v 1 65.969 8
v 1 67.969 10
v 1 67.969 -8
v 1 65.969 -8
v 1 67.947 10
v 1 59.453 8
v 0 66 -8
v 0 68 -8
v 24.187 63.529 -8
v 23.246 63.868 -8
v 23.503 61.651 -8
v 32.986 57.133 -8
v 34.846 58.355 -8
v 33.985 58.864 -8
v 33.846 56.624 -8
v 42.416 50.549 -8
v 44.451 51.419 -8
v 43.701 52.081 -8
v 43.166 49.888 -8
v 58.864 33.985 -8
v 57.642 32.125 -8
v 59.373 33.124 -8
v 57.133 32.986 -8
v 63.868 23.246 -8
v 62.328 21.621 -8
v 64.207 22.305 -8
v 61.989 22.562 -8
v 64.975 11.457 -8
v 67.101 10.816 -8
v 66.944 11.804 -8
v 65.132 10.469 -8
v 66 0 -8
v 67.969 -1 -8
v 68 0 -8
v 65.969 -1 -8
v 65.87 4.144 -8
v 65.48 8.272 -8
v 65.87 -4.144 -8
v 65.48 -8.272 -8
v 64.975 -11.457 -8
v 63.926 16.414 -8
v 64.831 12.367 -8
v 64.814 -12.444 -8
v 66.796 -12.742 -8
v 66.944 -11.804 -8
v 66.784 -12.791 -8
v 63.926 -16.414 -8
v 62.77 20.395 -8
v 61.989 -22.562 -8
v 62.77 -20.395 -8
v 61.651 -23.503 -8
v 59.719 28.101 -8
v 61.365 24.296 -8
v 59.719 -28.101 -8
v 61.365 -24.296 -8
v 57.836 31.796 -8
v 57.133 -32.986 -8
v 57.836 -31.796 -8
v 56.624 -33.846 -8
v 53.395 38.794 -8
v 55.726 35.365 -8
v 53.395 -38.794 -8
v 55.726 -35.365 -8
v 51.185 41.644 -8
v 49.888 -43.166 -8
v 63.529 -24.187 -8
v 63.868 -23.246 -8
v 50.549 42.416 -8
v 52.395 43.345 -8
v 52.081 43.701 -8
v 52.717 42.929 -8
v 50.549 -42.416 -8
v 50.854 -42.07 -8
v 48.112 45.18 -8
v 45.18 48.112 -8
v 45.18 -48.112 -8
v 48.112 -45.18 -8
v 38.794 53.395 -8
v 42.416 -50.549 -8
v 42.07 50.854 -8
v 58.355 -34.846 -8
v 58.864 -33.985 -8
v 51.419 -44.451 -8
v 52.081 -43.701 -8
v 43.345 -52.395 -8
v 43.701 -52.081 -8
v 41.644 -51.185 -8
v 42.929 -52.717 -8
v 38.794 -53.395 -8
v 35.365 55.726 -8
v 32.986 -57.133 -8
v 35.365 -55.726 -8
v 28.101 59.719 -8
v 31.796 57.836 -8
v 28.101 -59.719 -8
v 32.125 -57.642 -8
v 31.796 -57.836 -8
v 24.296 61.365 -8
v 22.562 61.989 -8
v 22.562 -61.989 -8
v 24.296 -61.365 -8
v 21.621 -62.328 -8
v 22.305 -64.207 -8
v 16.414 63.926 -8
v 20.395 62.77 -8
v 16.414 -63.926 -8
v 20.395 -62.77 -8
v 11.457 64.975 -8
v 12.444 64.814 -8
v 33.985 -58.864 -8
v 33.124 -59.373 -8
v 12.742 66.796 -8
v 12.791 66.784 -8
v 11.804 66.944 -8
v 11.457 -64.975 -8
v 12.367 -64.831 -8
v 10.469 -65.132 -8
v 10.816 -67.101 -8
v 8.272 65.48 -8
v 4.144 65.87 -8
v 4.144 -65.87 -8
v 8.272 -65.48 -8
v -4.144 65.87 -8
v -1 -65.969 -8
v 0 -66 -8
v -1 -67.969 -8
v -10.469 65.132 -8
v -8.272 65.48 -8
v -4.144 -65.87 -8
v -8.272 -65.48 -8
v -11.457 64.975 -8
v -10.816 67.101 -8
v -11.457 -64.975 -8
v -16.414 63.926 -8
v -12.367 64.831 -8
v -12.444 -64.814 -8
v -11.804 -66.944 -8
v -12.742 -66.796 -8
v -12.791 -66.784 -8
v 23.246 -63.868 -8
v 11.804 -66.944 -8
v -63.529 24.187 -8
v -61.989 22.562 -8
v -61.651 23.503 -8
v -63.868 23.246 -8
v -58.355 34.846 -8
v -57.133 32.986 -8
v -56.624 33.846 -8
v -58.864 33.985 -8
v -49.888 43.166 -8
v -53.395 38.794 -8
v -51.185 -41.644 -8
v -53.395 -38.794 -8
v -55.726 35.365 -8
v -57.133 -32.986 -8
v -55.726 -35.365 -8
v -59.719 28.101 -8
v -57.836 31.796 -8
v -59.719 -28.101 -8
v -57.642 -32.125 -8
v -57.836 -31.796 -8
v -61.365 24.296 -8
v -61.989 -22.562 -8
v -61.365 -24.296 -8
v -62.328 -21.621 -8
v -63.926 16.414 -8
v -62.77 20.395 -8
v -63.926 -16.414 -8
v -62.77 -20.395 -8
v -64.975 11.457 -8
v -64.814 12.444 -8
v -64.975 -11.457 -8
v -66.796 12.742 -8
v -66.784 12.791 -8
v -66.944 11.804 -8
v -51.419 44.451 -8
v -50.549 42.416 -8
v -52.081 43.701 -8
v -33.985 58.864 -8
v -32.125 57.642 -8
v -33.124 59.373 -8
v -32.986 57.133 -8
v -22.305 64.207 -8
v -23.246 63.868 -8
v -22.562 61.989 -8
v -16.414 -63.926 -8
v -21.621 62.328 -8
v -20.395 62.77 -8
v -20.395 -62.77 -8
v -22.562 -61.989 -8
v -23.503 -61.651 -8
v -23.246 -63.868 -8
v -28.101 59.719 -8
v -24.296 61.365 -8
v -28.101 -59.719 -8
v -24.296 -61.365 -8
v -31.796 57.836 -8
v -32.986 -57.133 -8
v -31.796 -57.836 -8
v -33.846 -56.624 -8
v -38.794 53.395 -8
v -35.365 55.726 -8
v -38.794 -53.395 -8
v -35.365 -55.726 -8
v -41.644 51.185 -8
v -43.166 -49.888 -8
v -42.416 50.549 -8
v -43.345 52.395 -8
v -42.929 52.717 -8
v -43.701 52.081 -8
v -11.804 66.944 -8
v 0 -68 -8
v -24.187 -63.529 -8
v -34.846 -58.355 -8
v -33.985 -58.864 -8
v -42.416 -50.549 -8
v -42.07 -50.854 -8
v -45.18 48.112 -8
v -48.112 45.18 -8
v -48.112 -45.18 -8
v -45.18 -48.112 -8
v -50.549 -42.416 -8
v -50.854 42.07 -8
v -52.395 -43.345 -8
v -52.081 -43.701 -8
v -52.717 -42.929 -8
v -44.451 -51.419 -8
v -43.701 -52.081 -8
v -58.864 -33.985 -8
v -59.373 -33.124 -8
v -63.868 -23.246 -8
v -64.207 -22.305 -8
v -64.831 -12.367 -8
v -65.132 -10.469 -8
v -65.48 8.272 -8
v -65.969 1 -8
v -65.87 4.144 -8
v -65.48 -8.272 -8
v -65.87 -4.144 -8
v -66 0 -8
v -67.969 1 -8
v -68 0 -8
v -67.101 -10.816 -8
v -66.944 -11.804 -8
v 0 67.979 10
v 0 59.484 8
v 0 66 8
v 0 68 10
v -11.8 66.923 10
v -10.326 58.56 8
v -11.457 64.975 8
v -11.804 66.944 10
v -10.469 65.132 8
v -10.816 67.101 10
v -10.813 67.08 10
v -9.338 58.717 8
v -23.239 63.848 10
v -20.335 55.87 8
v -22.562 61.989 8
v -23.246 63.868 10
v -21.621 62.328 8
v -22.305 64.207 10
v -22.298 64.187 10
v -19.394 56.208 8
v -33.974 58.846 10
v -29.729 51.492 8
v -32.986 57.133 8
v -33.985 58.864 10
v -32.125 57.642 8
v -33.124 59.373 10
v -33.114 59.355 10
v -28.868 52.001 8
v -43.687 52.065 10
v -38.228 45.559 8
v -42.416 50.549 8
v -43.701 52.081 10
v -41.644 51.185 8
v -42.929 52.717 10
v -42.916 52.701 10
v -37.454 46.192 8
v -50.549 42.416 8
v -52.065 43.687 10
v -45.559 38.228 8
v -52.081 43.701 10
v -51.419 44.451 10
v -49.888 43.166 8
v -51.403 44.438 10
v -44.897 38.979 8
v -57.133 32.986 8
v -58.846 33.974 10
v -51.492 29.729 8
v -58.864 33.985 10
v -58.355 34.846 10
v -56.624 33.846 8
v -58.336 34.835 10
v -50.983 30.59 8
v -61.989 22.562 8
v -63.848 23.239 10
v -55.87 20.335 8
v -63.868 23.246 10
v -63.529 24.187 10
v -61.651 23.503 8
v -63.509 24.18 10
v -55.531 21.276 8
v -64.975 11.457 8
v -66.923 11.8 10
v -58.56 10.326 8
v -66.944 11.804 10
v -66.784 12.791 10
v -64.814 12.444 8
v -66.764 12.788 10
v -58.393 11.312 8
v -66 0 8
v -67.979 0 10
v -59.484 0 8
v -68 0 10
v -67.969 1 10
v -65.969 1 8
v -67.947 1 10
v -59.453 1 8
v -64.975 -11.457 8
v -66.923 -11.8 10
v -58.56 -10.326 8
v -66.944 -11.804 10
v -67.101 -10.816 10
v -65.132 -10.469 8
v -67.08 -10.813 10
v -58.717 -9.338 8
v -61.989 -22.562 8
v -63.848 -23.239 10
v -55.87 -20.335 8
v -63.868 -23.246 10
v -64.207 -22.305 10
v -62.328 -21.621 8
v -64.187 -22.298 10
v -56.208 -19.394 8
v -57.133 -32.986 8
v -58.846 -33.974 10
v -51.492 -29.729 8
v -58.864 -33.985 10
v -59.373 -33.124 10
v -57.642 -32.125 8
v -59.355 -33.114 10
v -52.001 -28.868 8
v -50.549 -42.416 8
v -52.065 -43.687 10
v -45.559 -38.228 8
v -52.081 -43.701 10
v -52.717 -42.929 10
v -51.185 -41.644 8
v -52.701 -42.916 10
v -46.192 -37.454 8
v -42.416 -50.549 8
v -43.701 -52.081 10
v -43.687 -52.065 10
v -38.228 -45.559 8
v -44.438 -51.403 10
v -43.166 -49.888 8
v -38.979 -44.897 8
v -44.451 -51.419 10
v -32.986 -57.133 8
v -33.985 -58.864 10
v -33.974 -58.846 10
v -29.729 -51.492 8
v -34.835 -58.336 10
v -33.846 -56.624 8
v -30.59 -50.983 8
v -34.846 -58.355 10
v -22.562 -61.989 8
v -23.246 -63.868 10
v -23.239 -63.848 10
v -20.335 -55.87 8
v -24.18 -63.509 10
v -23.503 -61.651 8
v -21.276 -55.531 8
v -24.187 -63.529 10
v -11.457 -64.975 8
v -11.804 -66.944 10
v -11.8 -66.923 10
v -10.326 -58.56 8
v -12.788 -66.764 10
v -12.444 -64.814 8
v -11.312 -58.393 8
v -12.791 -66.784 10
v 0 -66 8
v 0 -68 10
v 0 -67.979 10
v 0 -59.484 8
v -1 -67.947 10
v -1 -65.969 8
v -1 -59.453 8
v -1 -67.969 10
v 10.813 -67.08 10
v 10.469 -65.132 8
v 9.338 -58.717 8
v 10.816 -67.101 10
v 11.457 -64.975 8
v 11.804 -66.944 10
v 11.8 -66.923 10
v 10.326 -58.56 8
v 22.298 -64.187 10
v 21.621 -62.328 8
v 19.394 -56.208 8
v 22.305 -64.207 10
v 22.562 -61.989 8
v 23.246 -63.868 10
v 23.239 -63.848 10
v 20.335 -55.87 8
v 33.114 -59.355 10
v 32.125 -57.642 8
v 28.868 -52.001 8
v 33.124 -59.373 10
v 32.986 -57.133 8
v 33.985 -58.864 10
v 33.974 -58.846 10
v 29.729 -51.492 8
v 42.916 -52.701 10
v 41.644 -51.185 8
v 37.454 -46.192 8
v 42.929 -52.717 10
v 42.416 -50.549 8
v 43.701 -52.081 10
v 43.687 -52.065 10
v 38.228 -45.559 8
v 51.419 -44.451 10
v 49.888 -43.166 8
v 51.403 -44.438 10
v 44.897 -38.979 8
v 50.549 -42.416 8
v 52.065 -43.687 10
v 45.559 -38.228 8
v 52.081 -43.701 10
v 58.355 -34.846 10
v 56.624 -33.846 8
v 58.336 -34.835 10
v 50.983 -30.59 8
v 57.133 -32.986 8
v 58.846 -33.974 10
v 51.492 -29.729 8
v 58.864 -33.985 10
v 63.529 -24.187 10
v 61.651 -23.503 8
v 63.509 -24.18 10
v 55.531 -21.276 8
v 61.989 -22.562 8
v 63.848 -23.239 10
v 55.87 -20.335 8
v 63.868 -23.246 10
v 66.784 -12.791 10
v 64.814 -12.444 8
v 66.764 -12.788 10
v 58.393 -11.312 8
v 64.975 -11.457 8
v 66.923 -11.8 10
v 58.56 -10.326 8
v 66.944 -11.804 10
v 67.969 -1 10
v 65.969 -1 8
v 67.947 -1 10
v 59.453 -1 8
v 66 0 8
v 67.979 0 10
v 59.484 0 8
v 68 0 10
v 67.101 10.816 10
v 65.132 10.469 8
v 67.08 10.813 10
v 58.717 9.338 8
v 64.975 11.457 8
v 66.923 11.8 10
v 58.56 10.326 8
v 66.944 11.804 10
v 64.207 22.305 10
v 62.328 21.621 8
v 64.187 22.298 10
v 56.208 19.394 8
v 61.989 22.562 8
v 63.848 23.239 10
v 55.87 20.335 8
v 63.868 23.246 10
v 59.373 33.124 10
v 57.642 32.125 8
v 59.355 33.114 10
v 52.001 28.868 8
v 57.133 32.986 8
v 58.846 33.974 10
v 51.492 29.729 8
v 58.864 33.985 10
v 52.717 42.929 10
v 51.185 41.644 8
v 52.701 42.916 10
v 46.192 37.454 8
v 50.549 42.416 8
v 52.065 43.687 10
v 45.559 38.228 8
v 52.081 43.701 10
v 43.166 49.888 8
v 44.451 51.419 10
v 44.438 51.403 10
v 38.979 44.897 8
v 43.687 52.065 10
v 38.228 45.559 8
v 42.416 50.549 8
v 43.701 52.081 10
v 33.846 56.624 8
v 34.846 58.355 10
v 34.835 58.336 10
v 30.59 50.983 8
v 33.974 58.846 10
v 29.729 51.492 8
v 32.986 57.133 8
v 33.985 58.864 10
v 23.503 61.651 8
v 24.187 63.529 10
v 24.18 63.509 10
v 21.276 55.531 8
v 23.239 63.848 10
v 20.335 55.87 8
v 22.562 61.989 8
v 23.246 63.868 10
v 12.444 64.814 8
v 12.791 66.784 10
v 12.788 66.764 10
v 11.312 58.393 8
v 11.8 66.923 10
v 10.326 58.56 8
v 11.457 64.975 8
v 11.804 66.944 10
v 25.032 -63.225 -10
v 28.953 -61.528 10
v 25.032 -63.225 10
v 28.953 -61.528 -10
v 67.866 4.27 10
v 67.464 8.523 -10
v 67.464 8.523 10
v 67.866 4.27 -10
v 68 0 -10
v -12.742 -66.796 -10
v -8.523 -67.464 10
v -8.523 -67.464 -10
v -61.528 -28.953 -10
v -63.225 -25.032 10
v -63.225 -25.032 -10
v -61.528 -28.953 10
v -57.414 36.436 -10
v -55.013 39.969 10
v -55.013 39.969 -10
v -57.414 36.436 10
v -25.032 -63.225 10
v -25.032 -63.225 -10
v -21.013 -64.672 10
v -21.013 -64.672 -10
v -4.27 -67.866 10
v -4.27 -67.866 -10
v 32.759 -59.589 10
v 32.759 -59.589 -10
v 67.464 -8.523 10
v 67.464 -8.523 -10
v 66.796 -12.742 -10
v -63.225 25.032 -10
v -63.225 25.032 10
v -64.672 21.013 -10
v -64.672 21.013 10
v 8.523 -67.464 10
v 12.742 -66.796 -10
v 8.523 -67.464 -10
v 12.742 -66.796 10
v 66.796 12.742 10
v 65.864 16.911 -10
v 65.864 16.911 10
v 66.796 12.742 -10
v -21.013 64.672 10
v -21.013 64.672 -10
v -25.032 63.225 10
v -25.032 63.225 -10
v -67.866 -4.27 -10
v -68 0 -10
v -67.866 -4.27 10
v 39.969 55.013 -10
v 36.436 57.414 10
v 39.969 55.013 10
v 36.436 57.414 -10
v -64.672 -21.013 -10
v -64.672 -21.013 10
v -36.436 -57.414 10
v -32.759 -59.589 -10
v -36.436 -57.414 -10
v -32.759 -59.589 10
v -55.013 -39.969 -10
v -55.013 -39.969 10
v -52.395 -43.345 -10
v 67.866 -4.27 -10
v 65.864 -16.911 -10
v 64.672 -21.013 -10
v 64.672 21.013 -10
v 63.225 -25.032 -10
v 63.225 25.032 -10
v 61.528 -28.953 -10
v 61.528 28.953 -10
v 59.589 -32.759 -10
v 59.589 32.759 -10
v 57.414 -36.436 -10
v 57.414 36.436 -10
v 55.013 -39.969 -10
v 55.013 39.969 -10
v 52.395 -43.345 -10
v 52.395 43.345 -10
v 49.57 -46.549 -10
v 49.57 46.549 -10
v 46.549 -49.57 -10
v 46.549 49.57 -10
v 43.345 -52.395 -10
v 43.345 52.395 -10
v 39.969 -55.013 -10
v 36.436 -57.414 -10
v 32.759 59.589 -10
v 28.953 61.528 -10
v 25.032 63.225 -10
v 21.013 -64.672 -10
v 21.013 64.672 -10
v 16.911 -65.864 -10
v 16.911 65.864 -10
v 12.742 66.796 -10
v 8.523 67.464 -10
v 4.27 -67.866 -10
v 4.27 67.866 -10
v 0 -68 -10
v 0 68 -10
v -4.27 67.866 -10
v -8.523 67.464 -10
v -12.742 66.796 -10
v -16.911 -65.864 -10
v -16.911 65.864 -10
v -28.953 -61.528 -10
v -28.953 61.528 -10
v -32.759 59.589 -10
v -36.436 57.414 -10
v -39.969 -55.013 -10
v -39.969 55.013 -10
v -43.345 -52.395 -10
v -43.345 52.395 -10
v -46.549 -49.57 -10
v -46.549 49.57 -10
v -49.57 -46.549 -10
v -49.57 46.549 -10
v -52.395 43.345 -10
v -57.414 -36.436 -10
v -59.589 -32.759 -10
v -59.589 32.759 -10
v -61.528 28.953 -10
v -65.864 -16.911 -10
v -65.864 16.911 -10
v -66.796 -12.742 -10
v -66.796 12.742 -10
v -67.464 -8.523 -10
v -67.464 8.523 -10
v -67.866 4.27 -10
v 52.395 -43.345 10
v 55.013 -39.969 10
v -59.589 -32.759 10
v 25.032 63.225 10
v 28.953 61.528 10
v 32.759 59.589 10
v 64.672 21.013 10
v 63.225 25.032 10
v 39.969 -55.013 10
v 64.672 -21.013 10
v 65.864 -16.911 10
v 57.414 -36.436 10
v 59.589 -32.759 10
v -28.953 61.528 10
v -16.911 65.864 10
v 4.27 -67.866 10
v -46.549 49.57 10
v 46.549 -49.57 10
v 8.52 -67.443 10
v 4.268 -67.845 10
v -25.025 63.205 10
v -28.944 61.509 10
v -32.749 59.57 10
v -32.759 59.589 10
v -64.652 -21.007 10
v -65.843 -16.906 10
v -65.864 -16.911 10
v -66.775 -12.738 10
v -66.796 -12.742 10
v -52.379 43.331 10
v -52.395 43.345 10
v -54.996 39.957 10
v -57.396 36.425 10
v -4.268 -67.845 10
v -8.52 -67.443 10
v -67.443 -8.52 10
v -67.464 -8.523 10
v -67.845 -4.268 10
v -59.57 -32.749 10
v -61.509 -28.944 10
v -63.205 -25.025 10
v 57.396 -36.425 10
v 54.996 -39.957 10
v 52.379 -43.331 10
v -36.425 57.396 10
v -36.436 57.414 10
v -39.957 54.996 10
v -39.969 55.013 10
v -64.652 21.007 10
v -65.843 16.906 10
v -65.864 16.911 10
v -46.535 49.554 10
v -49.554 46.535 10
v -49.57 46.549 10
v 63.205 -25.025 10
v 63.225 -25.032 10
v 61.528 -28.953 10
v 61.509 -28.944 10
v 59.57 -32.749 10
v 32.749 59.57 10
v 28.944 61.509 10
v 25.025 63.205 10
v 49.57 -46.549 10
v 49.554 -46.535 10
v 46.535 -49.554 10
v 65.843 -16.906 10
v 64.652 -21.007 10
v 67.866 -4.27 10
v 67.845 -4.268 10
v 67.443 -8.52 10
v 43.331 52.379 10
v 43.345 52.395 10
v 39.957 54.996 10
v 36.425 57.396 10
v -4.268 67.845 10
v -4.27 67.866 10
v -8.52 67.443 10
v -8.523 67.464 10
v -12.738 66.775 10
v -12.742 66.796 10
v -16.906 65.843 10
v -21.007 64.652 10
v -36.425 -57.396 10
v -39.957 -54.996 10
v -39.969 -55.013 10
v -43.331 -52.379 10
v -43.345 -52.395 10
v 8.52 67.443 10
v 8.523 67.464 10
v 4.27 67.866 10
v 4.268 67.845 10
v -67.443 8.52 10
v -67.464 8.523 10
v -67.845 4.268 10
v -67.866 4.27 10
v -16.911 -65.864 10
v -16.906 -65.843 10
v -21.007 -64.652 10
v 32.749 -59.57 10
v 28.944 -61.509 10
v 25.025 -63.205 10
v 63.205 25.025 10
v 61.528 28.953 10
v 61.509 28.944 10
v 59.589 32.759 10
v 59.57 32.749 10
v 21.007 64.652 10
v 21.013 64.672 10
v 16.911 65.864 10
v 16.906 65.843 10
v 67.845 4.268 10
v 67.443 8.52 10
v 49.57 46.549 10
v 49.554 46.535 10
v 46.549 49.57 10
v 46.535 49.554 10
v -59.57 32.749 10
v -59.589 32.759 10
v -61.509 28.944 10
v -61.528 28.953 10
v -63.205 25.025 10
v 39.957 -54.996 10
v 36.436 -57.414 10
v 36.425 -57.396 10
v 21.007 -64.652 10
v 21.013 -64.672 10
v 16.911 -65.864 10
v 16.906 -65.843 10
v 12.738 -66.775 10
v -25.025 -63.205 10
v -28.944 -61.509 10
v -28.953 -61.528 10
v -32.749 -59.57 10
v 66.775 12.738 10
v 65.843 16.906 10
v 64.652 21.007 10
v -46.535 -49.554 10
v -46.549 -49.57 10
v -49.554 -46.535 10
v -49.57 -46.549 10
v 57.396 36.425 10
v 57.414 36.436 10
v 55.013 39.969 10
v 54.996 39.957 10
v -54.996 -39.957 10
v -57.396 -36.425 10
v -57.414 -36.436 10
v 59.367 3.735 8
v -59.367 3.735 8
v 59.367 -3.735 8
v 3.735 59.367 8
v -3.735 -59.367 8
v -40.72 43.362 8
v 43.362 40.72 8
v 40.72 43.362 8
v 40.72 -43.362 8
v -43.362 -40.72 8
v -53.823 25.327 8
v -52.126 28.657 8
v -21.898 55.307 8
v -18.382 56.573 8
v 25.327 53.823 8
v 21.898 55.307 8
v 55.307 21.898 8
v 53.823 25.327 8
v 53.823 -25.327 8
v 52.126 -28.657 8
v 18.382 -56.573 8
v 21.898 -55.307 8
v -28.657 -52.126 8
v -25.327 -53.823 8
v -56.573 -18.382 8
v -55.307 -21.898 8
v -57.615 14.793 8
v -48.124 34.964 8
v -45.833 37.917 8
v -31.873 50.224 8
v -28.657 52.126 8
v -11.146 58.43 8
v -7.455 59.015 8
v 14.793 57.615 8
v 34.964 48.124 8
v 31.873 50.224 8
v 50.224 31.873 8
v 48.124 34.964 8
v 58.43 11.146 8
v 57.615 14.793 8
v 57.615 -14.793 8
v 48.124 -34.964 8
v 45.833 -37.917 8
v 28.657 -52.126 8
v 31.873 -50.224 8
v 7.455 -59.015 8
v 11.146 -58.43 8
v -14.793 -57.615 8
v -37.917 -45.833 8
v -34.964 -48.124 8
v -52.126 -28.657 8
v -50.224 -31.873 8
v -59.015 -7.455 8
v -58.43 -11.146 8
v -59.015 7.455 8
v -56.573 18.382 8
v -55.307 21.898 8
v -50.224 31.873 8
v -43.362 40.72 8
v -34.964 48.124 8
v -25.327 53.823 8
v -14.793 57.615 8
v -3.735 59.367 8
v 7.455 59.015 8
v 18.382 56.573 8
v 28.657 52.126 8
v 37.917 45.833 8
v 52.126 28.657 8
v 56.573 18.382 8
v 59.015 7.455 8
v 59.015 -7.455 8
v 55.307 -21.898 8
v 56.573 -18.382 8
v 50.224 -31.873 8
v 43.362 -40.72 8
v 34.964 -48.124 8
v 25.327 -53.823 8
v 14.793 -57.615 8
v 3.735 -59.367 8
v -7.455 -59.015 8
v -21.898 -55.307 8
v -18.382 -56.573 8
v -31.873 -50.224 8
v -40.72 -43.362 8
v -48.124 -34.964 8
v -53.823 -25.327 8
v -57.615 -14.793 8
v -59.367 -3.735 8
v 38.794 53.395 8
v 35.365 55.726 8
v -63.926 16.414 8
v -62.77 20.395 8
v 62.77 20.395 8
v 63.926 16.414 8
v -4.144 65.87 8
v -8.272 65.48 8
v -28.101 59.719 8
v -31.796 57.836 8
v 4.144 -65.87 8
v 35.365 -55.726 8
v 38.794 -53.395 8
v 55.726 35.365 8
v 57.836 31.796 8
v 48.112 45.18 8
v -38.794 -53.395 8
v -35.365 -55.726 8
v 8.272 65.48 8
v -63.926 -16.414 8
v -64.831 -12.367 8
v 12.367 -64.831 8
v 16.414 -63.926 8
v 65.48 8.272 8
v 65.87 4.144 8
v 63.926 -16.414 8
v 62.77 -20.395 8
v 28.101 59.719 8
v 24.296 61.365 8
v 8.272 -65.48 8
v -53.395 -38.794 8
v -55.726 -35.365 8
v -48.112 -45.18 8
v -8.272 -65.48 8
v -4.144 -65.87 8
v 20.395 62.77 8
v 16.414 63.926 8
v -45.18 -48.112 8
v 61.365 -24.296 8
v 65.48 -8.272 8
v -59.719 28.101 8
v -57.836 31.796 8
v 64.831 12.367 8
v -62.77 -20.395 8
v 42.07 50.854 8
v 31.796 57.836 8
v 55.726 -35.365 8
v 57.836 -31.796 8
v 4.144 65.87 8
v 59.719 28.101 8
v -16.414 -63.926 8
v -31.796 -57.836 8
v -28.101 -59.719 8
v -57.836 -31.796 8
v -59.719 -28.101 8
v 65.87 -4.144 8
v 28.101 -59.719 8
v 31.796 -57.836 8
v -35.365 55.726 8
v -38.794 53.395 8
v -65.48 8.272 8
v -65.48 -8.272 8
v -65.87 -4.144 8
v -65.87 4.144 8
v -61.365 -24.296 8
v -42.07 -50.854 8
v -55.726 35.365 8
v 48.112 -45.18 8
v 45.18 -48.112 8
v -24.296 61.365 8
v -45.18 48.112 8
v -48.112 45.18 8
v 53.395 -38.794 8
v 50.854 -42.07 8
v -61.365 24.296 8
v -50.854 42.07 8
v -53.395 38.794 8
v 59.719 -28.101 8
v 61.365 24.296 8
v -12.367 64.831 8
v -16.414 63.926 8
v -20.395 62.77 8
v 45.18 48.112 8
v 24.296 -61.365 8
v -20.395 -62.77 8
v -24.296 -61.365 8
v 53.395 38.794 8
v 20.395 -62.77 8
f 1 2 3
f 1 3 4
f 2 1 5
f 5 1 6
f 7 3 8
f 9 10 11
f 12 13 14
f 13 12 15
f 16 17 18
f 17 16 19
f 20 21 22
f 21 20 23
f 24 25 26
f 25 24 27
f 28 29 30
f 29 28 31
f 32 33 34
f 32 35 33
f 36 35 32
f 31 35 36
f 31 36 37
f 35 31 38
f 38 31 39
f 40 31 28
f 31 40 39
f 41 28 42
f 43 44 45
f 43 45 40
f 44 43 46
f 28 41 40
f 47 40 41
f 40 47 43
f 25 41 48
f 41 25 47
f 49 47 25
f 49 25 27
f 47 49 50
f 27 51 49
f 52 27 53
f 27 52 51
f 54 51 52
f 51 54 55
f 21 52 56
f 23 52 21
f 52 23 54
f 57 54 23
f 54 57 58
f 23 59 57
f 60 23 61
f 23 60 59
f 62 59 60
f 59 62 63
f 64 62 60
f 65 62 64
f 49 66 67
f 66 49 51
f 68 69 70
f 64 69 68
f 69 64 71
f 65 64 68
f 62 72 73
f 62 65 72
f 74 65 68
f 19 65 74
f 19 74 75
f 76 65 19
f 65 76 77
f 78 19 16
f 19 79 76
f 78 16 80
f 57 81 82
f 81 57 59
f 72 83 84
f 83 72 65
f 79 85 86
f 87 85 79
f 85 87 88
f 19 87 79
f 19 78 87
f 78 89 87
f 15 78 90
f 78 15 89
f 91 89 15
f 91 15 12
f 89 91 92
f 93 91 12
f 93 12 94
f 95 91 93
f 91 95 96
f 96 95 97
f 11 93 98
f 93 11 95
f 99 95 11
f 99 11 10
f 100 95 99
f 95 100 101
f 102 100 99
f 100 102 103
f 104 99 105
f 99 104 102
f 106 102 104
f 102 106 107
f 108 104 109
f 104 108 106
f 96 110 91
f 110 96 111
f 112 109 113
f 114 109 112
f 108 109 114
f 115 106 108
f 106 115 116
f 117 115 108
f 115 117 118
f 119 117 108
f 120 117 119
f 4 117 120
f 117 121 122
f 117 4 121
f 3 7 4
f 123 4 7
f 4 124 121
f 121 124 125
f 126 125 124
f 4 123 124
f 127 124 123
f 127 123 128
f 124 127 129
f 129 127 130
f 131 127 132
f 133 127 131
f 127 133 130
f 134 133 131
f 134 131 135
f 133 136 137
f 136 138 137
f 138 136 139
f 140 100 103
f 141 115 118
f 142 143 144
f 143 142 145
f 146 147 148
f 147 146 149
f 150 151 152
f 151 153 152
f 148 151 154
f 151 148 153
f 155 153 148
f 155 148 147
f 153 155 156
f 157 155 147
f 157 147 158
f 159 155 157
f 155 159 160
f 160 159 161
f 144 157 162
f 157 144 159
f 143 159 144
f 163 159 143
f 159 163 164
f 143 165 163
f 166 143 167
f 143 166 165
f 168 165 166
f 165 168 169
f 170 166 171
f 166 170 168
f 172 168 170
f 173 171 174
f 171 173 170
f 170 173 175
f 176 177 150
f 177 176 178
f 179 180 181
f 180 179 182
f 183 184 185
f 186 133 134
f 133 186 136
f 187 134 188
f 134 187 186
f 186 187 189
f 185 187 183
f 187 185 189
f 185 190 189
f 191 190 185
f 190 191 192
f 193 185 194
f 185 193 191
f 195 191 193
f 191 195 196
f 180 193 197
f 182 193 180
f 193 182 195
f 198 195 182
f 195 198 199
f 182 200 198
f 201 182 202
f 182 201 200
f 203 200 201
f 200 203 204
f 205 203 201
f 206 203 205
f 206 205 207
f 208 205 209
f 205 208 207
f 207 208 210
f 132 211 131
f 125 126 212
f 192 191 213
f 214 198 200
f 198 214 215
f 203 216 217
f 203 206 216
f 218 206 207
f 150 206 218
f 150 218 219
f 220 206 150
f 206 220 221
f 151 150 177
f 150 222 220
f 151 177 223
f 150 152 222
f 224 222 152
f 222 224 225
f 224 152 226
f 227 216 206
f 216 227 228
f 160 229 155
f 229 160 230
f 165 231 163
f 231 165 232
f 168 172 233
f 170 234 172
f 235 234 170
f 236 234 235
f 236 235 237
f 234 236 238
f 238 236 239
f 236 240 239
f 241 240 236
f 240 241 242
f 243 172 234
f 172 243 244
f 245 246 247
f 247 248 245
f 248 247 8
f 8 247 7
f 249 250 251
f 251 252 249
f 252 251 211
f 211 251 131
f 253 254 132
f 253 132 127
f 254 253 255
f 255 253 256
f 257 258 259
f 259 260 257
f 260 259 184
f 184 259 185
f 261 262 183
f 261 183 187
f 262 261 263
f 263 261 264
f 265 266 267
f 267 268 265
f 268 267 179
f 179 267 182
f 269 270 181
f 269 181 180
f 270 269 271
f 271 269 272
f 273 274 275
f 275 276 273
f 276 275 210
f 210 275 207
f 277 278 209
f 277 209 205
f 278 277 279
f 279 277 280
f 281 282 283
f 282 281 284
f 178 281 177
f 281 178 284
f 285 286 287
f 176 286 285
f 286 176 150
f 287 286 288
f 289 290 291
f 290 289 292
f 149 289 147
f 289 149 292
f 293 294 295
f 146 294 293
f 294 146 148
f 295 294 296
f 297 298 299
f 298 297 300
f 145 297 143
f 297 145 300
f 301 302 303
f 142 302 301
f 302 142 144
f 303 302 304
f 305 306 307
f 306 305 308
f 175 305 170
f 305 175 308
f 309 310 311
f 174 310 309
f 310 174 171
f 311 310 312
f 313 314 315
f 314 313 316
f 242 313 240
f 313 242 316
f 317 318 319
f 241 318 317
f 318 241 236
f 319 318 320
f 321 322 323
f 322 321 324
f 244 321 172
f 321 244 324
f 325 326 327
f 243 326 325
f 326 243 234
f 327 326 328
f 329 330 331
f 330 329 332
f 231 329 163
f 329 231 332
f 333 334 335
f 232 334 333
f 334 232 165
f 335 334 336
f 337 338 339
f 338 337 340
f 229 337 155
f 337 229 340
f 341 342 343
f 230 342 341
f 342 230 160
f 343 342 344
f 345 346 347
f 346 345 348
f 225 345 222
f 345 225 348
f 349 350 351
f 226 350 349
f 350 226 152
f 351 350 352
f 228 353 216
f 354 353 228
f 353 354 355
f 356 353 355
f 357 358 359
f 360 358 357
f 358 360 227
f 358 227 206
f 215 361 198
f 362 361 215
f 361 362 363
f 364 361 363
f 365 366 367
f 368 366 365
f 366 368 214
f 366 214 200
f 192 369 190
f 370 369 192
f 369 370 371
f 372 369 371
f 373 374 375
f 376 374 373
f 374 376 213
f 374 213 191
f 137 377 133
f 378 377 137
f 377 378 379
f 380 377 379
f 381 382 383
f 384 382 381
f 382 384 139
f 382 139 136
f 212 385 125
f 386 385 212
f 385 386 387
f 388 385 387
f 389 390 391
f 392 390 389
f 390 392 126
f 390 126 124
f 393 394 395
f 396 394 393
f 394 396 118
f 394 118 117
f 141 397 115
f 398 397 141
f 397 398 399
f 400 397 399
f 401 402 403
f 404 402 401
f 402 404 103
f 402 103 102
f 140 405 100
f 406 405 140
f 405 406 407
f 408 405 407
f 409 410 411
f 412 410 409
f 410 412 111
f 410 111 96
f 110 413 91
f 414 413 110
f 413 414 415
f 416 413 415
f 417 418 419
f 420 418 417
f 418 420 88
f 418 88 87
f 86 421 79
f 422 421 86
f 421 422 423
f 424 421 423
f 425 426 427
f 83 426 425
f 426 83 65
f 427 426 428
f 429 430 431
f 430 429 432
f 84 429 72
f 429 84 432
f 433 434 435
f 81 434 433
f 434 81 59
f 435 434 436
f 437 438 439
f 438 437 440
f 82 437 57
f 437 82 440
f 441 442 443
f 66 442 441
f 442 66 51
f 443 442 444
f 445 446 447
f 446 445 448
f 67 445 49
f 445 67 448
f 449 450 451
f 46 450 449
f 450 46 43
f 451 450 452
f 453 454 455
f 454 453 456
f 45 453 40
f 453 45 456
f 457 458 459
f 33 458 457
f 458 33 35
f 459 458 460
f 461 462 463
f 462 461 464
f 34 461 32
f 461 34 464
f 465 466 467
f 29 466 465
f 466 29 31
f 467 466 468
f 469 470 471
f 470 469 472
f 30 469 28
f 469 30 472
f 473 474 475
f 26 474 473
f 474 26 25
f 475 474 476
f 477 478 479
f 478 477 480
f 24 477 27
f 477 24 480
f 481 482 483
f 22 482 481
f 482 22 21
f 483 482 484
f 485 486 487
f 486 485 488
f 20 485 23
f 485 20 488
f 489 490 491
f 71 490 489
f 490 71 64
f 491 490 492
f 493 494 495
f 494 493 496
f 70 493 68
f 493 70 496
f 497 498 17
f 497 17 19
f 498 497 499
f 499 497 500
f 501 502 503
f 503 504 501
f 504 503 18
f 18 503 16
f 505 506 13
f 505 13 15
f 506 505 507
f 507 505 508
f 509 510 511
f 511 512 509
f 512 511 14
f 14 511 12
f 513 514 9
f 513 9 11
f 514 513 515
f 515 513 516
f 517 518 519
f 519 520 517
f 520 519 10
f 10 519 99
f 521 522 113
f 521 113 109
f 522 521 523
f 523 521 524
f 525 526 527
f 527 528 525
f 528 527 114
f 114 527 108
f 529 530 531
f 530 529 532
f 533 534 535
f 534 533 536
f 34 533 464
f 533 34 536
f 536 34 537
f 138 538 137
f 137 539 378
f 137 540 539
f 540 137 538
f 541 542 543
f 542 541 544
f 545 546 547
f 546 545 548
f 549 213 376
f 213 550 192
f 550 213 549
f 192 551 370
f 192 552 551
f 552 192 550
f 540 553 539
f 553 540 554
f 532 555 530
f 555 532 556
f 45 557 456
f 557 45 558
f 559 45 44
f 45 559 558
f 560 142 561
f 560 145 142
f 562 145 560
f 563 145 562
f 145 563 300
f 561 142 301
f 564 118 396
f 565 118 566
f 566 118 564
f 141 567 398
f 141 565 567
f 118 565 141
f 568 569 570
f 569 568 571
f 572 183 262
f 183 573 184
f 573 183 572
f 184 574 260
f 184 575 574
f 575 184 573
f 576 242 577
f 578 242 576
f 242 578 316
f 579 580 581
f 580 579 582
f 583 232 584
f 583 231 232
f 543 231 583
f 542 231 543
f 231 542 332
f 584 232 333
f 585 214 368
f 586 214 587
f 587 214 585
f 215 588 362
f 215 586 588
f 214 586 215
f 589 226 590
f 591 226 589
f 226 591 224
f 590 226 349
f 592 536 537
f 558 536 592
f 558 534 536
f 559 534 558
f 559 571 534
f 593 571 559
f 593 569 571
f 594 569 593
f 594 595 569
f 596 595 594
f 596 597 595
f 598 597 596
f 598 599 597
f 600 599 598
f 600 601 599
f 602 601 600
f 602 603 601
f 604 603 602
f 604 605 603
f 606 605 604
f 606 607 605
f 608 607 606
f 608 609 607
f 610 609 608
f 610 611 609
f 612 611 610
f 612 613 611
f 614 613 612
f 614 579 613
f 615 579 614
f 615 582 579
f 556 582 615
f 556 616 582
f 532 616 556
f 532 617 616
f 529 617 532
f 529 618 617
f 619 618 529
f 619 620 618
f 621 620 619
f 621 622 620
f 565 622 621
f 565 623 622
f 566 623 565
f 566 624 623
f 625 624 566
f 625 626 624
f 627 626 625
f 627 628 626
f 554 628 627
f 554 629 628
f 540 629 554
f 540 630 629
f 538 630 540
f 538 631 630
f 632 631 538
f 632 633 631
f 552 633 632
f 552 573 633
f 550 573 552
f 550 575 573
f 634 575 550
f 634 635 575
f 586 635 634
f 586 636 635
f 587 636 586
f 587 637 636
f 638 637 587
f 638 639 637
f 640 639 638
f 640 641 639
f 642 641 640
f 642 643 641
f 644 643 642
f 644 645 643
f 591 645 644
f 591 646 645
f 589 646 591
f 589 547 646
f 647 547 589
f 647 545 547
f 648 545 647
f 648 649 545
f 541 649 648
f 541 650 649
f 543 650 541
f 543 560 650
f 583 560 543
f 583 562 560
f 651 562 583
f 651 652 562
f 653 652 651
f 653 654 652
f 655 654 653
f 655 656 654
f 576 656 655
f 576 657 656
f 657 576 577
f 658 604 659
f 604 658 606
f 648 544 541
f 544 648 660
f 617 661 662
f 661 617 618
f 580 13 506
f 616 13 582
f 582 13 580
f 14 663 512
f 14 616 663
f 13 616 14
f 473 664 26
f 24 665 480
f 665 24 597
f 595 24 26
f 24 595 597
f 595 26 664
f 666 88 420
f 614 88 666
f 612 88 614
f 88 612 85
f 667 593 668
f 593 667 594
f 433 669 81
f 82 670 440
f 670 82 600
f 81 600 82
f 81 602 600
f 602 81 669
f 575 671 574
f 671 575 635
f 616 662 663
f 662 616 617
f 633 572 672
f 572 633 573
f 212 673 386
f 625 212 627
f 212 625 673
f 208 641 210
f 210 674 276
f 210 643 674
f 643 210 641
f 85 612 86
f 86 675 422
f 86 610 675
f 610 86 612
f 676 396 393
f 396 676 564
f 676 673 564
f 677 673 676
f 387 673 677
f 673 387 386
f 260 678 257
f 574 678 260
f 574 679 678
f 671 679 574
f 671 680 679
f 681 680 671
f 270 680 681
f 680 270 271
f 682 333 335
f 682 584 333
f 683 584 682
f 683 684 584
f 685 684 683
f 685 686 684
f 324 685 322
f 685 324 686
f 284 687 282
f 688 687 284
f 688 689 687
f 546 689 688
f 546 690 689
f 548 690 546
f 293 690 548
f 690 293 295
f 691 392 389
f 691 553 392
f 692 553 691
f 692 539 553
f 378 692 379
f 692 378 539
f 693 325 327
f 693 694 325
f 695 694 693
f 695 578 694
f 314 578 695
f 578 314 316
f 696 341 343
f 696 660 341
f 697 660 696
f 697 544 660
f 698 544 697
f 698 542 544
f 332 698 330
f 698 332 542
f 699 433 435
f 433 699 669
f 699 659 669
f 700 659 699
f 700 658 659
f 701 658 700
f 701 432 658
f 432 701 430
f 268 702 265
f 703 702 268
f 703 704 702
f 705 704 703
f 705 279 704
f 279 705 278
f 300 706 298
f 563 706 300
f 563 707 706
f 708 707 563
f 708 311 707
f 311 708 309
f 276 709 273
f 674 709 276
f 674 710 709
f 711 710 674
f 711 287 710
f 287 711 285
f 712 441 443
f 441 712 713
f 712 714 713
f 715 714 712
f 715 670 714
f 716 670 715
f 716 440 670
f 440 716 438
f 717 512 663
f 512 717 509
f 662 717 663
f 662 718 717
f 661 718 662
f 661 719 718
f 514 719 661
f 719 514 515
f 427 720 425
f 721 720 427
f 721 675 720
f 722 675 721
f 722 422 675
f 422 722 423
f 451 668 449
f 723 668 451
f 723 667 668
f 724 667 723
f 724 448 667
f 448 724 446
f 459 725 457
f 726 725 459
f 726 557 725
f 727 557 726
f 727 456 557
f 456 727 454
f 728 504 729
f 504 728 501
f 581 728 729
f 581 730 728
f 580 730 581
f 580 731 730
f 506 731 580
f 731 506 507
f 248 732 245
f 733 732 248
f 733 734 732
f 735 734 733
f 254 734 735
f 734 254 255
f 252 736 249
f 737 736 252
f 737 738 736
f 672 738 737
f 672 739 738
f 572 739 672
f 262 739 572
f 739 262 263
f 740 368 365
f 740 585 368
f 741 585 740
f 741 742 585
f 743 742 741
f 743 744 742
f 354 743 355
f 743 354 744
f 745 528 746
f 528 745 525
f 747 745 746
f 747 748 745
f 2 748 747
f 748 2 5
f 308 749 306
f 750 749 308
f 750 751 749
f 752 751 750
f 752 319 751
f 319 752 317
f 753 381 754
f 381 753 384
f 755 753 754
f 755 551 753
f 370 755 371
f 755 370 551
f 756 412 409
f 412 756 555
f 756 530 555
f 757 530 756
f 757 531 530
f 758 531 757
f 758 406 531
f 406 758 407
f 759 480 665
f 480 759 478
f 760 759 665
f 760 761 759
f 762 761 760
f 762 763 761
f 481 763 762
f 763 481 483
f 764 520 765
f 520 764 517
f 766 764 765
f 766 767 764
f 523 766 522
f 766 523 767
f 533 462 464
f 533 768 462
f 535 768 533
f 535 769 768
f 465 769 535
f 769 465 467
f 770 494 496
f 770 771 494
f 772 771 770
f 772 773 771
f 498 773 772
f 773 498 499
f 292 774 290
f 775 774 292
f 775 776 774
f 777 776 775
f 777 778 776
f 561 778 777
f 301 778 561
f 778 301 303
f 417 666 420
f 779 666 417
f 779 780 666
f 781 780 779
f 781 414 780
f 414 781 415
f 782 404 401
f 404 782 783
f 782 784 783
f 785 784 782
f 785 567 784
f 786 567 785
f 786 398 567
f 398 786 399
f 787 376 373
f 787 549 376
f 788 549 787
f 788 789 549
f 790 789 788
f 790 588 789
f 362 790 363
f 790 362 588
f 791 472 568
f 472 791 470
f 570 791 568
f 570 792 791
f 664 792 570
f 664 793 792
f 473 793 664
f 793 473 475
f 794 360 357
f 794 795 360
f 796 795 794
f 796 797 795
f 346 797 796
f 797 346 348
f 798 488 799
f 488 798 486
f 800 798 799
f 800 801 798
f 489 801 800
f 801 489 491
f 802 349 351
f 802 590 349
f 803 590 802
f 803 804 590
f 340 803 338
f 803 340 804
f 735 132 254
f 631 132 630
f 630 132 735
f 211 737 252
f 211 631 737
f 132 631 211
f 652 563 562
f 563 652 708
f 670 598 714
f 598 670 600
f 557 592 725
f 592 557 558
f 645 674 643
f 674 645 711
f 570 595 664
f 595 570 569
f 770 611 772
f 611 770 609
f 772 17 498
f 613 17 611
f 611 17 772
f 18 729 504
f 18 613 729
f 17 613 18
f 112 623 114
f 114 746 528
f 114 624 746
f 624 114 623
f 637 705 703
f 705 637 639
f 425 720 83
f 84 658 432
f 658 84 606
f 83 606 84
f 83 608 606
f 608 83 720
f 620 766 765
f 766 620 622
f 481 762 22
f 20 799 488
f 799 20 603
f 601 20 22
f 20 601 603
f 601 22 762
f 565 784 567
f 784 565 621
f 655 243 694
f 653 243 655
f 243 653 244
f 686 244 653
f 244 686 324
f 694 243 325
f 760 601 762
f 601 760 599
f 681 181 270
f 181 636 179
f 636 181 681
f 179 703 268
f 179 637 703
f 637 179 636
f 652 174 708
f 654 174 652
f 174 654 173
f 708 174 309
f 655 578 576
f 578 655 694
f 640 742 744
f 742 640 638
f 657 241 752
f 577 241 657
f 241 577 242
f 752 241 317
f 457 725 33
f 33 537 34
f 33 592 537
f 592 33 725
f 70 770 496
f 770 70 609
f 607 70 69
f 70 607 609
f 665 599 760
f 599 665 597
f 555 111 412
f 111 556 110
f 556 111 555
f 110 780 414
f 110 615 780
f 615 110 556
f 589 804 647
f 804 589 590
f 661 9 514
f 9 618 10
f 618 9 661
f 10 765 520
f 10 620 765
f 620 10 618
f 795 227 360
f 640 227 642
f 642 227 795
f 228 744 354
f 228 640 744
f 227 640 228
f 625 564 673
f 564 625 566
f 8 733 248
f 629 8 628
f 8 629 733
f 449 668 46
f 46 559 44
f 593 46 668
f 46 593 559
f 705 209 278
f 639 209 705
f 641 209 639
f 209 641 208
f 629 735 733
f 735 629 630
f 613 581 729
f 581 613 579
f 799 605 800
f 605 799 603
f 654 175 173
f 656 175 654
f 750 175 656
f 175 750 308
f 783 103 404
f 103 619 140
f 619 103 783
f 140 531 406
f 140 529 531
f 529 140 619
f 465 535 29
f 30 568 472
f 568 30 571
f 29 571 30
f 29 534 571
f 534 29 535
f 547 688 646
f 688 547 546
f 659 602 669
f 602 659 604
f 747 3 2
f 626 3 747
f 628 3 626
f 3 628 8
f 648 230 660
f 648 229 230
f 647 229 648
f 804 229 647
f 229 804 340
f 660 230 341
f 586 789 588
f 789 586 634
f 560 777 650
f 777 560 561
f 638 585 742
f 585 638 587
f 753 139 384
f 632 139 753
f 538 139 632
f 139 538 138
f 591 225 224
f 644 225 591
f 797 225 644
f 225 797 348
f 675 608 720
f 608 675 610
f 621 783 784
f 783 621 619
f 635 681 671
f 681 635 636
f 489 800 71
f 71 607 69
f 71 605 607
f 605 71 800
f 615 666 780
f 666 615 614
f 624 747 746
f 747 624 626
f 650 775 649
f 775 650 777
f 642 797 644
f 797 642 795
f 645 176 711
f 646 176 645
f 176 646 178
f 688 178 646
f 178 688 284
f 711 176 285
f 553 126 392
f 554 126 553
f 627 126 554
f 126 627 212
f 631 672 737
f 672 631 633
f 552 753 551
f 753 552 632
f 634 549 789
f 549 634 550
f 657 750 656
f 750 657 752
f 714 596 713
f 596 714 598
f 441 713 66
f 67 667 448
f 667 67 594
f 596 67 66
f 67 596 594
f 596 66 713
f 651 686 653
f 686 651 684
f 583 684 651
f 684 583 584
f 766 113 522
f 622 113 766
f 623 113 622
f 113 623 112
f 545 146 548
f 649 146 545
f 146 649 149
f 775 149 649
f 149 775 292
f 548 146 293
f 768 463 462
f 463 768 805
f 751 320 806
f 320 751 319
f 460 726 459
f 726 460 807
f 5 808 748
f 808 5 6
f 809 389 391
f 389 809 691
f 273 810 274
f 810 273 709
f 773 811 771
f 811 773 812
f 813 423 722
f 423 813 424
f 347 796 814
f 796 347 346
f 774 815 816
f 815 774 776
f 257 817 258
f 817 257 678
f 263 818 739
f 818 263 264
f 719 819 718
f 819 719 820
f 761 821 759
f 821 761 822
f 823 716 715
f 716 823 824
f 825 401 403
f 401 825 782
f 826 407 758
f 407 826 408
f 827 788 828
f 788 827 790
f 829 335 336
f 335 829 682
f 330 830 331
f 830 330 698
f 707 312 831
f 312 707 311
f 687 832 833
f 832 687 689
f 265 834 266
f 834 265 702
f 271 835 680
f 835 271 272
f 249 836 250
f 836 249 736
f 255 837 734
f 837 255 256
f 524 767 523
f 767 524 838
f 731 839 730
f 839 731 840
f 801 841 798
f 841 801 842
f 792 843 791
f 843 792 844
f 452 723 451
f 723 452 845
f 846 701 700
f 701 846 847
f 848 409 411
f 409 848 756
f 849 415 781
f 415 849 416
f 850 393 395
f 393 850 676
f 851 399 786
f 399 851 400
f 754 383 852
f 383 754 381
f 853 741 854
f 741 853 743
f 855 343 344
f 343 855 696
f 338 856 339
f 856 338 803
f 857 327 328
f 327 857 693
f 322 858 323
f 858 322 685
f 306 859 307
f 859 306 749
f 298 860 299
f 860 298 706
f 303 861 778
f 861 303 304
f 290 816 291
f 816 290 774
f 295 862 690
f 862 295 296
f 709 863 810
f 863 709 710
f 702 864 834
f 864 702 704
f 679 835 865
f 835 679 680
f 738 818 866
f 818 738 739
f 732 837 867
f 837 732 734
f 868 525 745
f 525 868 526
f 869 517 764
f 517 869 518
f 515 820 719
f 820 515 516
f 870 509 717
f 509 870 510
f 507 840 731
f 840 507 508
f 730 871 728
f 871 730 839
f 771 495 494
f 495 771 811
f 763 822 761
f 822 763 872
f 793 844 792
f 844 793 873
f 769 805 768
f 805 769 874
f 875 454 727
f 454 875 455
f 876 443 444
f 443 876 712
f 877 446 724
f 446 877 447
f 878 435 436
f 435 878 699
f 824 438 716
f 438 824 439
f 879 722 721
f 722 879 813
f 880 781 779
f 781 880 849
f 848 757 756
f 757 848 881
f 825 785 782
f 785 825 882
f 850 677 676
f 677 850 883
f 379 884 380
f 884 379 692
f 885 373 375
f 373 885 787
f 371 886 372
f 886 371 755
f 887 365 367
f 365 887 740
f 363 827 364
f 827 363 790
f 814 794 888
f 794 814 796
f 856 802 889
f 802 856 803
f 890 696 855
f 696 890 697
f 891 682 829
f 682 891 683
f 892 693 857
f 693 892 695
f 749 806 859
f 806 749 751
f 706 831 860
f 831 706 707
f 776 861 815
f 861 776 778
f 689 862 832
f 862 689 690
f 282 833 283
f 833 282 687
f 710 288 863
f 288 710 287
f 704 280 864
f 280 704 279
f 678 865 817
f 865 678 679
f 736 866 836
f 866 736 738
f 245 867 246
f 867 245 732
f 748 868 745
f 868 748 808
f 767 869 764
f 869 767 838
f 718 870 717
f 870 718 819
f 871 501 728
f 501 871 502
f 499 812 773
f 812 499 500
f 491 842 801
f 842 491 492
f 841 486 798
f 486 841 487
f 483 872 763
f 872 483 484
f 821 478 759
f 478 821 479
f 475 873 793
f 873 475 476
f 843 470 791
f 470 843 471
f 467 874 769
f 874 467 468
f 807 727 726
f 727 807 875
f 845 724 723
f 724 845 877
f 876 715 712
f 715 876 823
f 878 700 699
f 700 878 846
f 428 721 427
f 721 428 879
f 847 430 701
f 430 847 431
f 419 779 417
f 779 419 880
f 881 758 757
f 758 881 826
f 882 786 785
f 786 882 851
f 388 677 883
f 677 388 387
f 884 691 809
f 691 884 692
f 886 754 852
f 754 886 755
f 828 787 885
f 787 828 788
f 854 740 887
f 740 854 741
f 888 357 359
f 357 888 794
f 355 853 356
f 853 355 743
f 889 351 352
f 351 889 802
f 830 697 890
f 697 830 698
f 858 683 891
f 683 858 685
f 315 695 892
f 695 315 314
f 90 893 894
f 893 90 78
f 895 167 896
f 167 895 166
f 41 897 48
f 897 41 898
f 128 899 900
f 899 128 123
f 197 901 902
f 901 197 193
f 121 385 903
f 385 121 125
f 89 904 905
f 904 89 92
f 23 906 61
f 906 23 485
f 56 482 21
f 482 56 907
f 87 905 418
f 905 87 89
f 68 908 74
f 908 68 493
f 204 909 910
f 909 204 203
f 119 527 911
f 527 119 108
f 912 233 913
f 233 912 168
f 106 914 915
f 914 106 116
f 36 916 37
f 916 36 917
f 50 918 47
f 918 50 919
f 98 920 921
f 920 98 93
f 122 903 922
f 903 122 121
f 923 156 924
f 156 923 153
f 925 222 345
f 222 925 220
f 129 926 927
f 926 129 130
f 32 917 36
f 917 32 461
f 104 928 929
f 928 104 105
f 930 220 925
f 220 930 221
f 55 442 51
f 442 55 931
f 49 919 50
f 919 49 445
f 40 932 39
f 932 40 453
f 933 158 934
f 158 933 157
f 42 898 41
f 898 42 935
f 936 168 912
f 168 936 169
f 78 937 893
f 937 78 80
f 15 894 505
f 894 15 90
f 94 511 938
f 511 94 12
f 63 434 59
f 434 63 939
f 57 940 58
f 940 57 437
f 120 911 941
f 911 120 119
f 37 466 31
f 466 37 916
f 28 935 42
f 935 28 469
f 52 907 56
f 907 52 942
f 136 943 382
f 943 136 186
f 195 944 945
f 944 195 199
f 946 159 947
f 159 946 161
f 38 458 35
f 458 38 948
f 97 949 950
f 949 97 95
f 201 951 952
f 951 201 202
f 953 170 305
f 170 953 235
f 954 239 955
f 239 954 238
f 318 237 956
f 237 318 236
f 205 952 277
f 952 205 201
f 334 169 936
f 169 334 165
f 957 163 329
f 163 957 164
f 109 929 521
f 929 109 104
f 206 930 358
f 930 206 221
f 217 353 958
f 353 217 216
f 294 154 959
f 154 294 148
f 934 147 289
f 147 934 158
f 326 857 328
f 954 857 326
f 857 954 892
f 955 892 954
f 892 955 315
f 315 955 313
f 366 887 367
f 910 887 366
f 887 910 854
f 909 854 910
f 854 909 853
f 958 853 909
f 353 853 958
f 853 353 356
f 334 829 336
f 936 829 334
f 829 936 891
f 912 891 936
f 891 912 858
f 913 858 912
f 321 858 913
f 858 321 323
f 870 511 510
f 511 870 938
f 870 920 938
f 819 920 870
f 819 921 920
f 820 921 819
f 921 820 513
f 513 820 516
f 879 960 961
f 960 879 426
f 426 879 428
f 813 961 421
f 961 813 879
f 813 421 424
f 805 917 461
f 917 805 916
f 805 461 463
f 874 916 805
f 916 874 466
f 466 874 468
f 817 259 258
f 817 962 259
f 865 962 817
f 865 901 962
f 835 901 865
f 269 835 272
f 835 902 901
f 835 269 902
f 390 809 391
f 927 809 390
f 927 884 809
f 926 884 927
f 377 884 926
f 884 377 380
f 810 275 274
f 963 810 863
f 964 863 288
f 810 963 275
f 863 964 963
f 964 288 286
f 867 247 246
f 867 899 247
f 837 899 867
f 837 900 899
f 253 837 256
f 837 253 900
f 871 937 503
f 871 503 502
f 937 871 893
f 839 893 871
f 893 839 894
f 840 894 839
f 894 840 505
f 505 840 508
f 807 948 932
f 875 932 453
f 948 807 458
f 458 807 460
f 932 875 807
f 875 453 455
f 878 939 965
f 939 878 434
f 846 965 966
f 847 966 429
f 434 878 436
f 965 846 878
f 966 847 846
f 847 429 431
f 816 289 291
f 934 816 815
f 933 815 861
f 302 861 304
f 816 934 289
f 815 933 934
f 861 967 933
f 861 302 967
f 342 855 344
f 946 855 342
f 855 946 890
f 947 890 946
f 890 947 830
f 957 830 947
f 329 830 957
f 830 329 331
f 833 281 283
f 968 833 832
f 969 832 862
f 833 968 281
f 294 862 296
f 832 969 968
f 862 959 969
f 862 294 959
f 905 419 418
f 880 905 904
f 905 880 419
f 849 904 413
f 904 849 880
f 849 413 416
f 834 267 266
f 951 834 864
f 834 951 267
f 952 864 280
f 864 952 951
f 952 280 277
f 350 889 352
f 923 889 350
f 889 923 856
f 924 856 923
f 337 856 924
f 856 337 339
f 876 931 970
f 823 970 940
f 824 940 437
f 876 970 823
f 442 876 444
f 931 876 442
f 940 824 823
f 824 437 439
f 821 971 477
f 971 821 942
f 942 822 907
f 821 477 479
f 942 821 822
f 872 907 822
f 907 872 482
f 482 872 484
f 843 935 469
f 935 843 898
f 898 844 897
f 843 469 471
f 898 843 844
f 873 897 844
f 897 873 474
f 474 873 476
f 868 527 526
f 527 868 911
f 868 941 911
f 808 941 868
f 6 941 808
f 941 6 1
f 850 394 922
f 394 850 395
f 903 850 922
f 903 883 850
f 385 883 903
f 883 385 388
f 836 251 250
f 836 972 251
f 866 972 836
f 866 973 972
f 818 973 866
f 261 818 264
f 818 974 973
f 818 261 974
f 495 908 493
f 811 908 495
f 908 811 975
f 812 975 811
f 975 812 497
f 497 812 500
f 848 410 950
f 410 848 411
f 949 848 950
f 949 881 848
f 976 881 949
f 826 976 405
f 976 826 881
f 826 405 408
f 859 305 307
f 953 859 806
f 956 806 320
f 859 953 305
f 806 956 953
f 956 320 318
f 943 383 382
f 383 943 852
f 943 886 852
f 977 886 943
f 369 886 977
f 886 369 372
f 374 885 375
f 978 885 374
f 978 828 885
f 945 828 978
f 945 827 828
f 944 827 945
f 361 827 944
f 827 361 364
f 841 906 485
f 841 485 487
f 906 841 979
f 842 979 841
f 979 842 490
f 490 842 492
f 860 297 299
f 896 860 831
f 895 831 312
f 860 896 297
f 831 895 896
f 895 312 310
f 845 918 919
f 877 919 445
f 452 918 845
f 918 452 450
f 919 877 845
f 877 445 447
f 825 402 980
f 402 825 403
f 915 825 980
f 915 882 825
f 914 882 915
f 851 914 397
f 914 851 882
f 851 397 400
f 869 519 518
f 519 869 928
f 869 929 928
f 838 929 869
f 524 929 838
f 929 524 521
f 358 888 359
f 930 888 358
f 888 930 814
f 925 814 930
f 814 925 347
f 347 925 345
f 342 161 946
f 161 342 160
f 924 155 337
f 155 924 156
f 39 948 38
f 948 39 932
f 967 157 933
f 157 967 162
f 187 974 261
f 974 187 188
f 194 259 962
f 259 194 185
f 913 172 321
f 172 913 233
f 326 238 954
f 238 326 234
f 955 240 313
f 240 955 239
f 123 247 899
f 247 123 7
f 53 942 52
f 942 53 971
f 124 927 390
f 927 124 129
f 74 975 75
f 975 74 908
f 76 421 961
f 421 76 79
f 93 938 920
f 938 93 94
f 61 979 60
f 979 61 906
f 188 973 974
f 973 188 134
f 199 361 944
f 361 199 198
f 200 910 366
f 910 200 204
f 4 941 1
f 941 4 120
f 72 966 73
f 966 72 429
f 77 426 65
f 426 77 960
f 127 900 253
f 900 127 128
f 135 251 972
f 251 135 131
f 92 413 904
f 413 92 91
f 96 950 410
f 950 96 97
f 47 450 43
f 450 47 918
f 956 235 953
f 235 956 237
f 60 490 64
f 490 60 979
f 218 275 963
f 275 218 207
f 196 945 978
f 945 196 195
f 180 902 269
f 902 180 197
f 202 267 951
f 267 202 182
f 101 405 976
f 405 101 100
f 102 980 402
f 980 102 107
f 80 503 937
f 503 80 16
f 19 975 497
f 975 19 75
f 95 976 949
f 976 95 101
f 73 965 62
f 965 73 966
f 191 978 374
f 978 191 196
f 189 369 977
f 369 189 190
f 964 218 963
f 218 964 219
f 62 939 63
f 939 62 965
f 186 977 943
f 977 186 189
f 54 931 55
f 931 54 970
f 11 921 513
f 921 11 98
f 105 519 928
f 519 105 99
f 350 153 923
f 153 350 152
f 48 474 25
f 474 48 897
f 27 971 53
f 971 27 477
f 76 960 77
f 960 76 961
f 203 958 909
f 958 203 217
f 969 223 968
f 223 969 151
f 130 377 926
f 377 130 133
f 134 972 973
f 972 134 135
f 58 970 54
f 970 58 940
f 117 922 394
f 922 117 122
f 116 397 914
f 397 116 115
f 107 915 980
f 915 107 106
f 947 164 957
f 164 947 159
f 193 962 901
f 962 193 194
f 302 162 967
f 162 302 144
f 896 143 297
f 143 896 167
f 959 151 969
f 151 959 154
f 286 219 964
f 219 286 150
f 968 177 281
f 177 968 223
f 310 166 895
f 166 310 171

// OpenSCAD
// Internal diameter
diameter = 66;

// Height
height = 20;

module cap(r, h, w, fn = 32) {
    extRadius = r + w;
    difference() {
        cylinder(r = extRadius, h = h, center = true, $fn = fn);
        for (i = [0:10:360]) translate([0, 0, (-h / 2) + w]) rotate([0, 0, i]) cube([1, extRadius + 1, h], center = false);
        translate([0, 0, w]) cylinder(r1 = 0, r2 = extRadius, h = h + 0.01 - (2*w), center = true, $fn = fn);
        cylinder(r = r, h = h - (2*w), center = true, $fn = fn);
    }  
}

// Cap (r is the inner radius, h is the height, w is the wall thickness)
cap(r = diameter, h = height, w = 2, fn = 100);
